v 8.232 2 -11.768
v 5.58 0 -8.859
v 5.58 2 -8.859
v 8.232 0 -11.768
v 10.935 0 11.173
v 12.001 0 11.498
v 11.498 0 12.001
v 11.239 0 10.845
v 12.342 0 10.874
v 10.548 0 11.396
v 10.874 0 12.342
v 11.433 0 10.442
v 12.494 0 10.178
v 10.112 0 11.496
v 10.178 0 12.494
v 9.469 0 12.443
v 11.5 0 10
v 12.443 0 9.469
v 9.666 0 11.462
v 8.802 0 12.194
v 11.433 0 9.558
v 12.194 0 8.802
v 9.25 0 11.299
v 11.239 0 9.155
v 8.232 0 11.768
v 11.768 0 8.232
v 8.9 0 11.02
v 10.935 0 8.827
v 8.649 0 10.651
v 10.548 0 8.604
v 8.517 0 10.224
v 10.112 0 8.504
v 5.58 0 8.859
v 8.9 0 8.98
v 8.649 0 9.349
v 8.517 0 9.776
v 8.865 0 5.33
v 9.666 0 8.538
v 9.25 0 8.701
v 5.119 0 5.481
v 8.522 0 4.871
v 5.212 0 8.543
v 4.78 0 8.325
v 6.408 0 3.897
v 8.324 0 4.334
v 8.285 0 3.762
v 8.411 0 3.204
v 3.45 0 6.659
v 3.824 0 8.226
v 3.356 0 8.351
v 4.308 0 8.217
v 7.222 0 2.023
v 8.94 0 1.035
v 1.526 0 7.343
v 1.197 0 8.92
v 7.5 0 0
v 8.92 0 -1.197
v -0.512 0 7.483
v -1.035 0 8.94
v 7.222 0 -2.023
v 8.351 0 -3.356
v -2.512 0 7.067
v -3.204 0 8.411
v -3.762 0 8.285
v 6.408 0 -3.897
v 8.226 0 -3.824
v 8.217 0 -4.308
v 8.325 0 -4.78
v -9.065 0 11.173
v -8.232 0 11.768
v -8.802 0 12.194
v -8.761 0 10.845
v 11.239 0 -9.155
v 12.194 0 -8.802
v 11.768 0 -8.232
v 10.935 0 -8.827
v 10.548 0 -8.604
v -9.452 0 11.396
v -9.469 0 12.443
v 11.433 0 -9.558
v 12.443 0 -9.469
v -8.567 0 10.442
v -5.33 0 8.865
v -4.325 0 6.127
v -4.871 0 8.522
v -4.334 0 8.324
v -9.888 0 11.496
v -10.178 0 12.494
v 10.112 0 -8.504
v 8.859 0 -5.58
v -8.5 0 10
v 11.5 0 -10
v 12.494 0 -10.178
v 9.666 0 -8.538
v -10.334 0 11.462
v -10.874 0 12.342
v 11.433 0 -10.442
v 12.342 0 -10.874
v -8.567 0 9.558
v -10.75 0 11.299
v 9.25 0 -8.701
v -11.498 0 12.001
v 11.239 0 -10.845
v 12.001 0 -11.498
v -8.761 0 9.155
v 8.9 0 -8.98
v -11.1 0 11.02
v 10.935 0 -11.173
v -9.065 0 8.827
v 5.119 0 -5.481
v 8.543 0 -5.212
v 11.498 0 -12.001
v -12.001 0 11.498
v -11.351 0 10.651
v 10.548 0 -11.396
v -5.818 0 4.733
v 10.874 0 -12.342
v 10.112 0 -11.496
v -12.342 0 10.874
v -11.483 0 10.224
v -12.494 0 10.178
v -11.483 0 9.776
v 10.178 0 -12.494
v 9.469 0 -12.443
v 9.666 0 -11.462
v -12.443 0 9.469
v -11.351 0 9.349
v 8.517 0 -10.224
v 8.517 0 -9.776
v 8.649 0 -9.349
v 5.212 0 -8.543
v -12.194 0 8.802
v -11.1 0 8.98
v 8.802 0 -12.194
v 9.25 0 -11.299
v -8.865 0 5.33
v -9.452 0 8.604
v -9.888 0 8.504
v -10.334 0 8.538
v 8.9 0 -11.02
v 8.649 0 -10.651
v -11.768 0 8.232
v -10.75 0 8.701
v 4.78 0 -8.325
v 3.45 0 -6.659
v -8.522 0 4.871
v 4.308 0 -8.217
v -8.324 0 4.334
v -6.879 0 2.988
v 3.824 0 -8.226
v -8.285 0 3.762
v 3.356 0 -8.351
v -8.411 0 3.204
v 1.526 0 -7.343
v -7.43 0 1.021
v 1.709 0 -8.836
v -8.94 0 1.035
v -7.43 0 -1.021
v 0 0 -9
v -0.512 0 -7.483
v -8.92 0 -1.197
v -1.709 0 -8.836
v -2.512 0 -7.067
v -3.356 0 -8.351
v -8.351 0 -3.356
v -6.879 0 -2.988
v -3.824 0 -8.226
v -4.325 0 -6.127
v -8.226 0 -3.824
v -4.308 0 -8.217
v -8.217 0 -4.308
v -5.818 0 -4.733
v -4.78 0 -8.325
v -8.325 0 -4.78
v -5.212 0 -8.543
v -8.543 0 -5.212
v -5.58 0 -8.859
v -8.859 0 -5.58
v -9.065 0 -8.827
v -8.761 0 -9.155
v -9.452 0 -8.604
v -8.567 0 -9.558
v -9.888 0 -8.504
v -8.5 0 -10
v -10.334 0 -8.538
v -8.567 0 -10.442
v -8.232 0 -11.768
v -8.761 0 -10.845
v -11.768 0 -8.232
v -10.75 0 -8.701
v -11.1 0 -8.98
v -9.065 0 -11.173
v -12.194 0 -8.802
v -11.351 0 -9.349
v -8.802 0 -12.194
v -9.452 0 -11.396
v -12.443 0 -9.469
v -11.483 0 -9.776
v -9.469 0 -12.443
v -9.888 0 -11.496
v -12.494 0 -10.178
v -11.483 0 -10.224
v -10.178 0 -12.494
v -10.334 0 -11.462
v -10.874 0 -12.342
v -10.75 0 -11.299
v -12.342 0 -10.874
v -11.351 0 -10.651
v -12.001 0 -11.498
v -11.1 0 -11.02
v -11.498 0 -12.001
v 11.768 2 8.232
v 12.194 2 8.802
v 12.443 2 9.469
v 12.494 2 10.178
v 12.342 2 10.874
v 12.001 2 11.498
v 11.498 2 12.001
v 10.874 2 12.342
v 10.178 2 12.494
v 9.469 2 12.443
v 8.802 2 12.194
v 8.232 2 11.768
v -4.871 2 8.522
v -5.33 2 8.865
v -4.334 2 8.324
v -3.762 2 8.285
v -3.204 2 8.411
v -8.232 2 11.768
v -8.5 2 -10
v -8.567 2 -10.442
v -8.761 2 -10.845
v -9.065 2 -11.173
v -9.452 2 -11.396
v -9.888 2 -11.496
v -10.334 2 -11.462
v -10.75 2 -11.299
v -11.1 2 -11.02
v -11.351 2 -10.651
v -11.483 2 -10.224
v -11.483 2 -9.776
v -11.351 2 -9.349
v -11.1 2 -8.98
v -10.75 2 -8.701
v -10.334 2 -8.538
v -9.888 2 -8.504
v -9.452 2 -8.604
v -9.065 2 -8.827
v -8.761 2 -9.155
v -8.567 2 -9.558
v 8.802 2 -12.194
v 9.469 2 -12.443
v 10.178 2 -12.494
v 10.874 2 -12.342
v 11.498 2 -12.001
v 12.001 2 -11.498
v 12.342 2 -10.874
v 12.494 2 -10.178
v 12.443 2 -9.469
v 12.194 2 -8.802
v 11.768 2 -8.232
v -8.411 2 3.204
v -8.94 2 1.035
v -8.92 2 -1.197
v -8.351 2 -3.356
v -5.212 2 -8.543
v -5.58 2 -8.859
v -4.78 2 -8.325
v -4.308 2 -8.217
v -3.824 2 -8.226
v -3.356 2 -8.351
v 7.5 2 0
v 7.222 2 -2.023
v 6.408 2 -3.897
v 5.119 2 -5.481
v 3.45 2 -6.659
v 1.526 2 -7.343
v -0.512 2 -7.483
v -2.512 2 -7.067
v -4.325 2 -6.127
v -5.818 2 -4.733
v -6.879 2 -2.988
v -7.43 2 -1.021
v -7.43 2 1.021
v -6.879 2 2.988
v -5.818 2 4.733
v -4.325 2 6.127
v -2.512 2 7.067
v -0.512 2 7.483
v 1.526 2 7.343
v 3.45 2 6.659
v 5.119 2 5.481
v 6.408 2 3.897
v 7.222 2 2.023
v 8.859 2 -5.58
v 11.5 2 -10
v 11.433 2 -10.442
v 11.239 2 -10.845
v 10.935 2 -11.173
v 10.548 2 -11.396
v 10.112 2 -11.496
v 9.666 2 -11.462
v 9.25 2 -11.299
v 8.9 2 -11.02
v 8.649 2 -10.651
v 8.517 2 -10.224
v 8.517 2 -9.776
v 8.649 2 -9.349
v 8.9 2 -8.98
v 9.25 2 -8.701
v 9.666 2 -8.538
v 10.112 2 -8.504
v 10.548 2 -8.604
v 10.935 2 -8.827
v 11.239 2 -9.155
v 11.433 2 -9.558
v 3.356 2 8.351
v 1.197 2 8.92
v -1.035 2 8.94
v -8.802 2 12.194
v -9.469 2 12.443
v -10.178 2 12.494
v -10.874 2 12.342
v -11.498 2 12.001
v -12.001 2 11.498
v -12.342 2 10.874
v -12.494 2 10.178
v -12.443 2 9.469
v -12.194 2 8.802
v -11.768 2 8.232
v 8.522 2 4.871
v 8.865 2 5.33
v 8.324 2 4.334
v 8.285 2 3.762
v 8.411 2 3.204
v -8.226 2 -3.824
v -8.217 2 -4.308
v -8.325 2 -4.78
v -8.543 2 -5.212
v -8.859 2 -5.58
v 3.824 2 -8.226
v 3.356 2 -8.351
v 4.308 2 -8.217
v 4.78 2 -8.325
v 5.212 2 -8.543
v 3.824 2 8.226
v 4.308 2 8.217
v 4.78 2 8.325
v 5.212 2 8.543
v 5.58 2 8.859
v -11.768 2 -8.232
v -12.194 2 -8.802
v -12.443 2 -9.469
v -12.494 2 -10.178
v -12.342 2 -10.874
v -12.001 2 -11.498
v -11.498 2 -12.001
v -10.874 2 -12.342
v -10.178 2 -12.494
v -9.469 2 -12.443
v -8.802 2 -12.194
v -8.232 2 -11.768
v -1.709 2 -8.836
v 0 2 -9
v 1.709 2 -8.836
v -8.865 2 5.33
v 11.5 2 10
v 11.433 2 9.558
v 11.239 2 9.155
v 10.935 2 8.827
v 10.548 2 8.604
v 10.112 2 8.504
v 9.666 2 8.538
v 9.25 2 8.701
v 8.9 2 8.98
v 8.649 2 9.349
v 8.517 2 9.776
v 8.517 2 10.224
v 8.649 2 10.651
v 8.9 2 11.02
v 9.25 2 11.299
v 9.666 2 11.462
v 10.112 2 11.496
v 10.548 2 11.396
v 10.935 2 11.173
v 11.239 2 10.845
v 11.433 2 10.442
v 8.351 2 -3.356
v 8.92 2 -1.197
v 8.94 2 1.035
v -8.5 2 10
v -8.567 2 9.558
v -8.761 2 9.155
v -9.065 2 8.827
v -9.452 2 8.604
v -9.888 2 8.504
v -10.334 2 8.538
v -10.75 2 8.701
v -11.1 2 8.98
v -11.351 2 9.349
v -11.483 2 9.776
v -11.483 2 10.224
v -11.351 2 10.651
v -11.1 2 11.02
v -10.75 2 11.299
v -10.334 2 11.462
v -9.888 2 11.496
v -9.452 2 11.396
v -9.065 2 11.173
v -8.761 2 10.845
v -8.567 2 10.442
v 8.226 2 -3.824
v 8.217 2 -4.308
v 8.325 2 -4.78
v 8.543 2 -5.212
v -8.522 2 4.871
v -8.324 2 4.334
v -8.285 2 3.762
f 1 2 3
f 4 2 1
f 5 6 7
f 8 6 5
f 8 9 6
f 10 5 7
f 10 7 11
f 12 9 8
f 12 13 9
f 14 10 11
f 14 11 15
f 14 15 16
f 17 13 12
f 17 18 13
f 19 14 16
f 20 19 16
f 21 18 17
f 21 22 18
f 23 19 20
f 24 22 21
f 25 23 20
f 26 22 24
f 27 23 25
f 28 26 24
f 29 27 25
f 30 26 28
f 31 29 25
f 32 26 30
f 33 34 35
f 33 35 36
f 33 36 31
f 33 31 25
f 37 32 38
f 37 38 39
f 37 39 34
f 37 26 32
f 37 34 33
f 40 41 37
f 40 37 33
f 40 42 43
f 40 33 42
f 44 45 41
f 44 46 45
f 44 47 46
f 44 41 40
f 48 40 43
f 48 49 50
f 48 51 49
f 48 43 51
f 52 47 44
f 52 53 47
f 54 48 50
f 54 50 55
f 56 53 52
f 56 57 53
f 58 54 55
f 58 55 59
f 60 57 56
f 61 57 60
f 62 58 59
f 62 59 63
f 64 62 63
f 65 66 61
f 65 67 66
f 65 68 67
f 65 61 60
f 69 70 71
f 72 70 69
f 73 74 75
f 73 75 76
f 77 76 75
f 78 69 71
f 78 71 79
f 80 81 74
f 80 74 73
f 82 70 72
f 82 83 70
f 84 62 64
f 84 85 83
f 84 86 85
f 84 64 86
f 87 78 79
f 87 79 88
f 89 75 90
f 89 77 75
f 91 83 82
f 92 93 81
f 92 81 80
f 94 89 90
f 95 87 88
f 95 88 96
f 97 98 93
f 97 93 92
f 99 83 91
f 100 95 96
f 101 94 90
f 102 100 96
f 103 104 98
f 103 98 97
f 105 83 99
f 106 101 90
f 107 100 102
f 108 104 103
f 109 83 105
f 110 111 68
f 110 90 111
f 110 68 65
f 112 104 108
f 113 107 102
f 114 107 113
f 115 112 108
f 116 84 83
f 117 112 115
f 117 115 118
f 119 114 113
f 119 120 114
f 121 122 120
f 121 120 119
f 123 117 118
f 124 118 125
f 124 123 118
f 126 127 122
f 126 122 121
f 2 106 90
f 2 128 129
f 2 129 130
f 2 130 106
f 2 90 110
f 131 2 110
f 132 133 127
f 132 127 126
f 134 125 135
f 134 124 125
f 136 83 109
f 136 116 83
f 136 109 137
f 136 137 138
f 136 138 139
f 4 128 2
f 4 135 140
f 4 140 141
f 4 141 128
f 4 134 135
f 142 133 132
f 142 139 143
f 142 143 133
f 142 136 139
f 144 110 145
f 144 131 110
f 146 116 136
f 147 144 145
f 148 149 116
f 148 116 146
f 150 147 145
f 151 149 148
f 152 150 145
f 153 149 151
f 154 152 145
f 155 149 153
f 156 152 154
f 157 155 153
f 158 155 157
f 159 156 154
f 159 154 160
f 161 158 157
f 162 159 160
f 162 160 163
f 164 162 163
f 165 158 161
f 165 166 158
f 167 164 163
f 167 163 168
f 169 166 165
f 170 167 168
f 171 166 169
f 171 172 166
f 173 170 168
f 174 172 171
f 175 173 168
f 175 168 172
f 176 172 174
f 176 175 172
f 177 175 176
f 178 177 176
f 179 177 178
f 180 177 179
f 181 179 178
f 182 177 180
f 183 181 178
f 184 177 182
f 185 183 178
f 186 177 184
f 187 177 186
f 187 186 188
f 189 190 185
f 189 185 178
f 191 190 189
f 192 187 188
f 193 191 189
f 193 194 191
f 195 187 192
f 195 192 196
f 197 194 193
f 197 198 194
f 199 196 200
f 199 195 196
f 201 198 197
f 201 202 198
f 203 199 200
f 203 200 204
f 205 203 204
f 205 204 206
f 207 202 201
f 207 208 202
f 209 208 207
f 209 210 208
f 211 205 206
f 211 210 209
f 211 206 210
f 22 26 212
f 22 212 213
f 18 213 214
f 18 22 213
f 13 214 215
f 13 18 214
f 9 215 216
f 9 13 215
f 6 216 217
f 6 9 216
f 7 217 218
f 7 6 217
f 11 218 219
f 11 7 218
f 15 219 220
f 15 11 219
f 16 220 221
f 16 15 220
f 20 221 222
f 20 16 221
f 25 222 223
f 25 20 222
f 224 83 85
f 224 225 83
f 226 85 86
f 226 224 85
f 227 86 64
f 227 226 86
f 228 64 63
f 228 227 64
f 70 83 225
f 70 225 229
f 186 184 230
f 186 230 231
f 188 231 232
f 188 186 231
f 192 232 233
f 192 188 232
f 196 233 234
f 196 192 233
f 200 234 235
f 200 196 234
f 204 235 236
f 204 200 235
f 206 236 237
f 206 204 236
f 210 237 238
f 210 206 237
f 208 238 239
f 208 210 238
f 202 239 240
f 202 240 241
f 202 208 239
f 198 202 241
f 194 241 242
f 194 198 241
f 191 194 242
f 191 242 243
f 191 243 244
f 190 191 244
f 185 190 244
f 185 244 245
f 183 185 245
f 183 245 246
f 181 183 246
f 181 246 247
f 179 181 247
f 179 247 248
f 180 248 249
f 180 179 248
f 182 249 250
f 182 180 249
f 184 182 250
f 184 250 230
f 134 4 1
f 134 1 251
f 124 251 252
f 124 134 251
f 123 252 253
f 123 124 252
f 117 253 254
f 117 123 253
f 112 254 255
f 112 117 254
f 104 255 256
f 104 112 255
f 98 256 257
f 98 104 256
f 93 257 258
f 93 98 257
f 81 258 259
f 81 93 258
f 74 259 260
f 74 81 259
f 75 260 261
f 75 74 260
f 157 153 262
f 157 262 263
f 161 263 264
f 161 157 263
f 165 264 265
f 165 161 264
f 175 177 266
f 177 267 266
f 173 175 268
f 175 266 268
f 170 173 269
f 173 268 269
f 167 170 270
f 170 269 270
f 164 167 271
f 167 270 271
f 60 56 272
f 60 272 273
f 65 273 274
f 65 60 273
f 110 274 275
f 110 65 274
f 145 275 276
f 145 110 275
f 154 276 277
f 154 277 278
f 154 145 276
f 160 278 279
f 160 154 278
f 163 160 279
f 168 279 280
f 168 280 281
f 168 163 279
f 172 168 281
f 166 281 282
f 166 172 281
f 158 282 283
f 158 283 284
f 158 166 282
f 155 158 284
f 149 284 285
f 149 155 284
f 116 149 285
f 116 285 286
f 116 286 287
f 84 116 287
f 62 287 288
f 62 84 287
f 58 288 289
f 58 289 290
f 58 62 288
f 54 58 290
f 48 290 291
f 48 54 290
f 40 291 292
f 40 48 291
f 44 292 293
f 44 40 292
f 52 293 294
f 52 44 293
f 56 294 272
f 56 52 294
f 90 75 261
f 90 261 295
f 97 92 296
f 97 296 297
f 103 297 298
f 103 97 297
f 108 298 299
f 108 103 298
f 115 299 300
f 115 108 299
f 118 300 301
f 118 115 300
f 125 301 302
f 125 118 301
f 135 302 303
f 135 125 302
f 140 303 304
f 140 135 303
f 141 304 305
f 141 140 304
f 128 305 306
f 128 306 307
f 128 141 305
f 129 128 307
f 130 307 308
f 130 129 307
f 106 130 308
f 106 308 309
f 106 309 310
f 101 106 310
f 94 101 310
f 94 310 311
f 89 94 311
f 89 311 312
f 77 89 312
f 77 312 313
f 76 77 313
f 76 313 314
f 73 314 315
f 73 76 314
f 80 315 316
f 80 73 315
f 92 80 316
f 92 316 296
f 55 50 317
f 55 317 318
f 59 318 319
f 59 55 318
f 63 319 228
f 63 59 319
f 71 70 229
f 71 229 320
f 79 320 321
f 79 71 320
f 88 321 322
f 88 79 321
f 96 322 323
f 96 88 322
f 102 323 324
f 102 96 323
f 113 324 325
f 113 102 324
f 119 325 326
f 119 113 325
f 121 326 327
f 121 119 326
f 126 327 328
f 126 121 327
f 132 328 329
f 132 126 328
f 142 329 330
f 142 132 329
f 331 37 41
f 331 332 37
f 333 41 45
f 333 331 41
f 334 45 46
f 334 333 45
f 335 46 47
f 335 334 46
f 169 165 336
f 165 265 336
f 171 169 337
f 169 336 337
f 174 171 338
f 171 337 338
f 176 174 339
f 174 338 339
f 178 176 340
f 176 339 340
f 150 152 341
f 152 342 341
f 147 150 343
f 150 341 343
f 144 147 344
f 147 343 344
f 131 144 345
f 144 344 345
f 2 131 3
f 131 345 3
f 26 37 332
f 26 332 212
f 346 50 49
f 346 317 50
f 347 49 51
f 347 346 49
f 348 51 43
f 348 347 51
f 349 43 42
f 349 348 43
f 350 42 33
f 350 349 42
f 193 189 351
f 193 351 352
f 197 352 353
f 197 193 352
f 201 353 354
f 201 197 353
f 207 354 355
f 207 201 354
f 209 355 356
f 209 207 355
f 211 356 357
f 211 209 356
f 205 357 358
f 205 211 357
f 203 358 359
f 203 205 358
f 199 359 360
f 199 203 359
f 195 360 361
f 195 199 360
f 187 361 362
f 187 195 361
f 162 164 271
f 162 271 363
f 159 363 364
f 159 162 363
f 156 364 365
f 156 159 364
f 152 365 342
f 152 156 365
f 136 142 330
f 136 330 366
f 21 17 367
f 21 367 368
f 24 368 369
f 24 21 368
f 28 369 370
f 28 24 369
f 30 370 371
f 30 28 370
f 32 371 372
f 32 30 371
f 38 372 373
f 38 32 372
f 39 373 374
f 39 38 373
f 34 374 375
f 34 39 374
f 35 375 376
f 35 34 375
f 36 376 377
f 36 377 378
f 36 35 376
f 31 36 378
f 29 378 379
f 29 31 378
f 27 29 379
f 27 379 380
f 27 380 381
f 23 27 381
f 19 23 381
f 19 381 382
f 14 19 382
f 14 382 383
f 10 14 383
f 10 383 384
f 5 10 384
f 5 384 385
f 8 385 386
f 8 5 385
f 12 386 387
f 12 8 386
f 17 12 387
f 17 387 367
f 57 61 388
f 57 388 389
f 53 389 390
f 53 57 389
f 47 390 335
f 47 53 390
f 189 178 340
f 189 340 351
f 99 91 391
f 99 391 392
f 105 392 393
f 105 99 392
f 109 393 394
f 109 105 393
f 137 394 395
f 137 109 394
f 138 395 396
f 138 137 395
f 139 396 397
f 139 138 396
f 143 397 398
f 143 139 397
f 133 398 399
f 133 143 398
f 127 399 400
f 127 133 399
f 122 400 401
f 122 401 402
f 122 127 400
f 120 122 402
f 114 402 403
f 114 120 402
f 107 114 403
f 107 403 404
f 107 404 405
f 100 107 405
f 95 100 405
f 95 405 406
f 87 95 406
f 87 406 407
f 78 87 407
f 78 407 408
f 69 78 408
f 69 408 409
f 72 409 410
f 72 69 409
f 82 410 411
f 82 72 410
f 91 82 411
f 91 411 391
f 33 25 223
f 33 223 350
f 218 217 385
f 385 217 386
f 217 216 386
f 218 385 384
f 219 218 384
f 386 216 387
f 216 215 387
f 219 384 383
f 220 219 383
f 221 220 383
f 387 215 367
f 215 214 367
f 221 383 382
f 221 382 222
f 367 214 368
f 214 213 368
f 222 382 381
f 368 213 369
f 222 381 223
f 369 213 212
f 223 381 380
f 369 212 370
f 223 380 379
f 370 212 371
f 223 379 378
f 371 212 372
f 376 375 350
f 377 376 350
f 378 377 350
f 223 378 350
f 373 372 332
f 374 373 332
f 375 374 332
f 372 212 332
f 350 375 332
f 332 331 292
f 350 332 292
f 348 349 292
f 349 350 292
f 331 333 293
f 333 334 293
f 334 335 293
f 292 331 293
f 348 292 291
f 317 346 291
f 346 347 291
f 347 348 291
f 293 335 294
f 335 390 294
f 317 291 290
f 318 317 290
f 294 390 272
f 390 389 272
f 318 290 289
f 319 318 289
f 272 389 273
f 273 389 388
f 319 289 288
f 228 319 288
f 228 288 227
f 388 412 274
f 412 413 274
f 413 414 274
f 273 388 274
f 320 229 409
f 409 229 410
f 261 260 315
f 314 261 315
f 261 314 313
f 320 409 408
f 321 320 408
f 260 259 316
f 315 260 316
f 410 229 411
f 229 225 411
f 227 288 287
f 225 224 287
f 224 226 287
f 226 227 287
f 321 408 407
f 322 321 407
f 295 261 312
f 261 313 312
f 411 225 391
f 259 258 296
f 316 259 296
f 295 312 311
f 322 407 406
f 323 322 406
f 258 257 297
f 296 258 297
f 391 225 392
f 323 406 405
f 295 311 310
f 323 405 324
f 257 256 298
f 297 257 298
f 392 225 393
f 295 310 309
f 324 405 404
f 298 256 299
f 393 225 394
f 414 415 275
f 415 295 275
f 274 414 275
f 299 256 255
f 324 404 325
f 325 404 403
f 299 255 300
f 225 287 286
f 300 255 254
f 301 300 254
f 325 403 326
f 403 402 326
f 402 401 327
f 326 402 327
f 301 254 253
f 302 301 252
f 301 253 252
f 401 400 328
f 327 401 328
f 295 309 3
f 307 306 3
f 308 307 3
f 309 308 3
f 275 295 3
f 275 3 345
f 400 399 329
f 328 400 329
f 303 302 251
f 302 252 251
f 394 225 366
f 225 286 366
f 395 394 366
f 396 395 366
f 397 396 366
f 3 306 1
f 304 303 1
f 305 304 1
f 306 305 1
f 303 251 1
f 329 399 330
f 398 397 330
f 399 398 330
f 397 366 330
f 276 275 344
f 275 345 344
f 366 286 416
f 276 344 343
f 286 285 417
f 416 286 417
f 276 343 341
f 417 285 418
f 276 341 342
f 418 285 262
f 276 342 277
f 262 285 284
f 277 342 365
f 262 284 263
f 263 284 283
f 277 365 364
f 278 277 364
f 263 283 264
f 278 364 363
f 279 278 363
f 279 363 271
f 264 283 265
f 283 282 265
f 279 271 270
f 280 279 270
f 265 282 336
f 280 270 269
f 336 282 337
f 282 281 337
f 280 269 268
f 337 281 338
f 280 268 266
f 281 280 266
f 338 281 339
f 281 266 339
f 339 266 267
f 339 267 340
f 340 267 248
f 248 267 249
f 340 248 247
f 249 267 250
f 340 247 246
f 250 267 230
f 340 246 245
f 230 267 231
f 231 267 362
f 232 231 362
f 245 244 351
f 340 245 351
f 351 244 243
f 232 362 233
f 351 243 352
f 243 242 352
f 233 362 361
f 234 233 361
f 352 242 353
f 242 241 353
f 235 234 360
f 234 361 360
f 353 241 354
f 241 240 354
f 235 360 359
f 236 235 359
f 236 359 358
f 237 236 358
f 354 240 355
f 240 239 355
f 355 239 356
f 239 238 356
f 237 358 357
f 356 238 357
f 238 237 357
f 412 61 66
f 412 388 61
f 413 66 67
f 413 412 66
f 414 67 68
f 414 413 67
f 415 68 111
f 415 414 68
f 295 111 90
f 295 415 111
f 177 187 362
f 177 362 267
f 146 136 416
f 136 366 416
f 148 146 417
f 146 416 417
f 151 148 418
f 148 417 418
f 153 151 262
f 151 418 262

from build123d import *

# Parameters (mm, degrees)
SKETCH1_R           = 7.5
SKETCH1_R_2         = 1.5
BOSS_EXTRUDE1_DEPTH = 2
FILLET1_R           = 2


with BuildPart() as part:
    # Sketch1 → Boss-Extrude1 (new body)
    with BuildSketch(Plane(origin=(0, 0, 0), x_dir=(1, 0, 0), z_dir=(0, 1, 0))):
        with BuildLine():
            Line((-11.767766953, -8.232233047), (-7.881276583, -4.345742677))
            ThreePointArc((-7.881276583, -4.345742677), (-8.999066908, 0.129594703), (-7.75286903, 4.570888514))
            Line((-7.75286903, 4.570888514), (-11.767766953, 8.232233047))
            ThreePointArc((-11.767766953, 8.232233047), (-11.767766953, 11.767766953), (-8.232233047, 11.767766953))
            Line((-8.232233047, 11.767766953), (-4.570888514, 7.75286903))
            ThreePointArc((-4.570888514, 7.75286903), (0, 9), (4.570888514, 7.75286903))
            Line((4.570888514, 7.75286903), (8.232233047, 11.767766953))
            ThreePointArc((8.232233047, 11.767766953), (11.767766953, 11.767766953), (11.767766953, 8.232233047))
            Line((11.767766953, 8.232233047), (7.75286903, 4.570888514))
            ThreePointArc((7.75286903, 4.570888514), (8.999066908, 0.129594703), (7.881276583, -4.345742677))
            Line((7.881276583, -4.345742677), (11.767766953, -8.232233047))
            ThreePointArc((11.767766953, -8.232233047), (11.767766953, -11.767766953), (8.232233047, -11.767766953))
            Line((8.232233047, -11.767766953), (4.570888514, -7.75286903))
            ThreePointArc((4.570888514, -7.75286903), (0.129594703, -8.999066908), (-4.345742677, -7.881276583))
            Line((-4.345742677, -7.881276583), (-8.232233047, -11.767766953))
            ThreePointArc((-8.232233047, -11.767766953), (-11.767766953, -11.767766953), (-11.767766953, -8.232233047))
        make_face()
        Circle(SKETCH1_R, mode=Mode.SUBTRACT)
        with Locations((-10, -10)):
            Circle(SKETCH1_R_2, mode=Mode.SUBTRACT)
        with Locations((10, -10)):
            Circle(SKETCH1_R_2, mode=Mode.SUBTRACT)
        with Locations((10, 10)):
            Circle(SKETCH1_R_2, mode=Mode.SUBTRACT)
        with Locations((-10, 10)):
            Circle(SKETCH1_R_2, mode=Mode.SUBTRACT)
    extrude(amount=BOSS_EXTRUDE1_DEPTH)

    # Fillet1
    fillet1_edges = [part.edges().sort_by_distance(p)[0] for p in [
        (-7.881276583, 1, 4.345742677),
        (-7.75286903, 1, -4.570888514),
        (-4.570888514, 1, -7.75286903),
        (4.570888514, 1, -7.75286903),
        (7.75286903, 1, -4.570888514),
        (7.881276583, 1, 4.345742677),
        (4.570888514, 1, 7.75286903),
        (-4.345742677, 1, 7.881276583),
    ]]
    fillet(fillet1_edges, radius=FILLET1_R)


solid = part.part
